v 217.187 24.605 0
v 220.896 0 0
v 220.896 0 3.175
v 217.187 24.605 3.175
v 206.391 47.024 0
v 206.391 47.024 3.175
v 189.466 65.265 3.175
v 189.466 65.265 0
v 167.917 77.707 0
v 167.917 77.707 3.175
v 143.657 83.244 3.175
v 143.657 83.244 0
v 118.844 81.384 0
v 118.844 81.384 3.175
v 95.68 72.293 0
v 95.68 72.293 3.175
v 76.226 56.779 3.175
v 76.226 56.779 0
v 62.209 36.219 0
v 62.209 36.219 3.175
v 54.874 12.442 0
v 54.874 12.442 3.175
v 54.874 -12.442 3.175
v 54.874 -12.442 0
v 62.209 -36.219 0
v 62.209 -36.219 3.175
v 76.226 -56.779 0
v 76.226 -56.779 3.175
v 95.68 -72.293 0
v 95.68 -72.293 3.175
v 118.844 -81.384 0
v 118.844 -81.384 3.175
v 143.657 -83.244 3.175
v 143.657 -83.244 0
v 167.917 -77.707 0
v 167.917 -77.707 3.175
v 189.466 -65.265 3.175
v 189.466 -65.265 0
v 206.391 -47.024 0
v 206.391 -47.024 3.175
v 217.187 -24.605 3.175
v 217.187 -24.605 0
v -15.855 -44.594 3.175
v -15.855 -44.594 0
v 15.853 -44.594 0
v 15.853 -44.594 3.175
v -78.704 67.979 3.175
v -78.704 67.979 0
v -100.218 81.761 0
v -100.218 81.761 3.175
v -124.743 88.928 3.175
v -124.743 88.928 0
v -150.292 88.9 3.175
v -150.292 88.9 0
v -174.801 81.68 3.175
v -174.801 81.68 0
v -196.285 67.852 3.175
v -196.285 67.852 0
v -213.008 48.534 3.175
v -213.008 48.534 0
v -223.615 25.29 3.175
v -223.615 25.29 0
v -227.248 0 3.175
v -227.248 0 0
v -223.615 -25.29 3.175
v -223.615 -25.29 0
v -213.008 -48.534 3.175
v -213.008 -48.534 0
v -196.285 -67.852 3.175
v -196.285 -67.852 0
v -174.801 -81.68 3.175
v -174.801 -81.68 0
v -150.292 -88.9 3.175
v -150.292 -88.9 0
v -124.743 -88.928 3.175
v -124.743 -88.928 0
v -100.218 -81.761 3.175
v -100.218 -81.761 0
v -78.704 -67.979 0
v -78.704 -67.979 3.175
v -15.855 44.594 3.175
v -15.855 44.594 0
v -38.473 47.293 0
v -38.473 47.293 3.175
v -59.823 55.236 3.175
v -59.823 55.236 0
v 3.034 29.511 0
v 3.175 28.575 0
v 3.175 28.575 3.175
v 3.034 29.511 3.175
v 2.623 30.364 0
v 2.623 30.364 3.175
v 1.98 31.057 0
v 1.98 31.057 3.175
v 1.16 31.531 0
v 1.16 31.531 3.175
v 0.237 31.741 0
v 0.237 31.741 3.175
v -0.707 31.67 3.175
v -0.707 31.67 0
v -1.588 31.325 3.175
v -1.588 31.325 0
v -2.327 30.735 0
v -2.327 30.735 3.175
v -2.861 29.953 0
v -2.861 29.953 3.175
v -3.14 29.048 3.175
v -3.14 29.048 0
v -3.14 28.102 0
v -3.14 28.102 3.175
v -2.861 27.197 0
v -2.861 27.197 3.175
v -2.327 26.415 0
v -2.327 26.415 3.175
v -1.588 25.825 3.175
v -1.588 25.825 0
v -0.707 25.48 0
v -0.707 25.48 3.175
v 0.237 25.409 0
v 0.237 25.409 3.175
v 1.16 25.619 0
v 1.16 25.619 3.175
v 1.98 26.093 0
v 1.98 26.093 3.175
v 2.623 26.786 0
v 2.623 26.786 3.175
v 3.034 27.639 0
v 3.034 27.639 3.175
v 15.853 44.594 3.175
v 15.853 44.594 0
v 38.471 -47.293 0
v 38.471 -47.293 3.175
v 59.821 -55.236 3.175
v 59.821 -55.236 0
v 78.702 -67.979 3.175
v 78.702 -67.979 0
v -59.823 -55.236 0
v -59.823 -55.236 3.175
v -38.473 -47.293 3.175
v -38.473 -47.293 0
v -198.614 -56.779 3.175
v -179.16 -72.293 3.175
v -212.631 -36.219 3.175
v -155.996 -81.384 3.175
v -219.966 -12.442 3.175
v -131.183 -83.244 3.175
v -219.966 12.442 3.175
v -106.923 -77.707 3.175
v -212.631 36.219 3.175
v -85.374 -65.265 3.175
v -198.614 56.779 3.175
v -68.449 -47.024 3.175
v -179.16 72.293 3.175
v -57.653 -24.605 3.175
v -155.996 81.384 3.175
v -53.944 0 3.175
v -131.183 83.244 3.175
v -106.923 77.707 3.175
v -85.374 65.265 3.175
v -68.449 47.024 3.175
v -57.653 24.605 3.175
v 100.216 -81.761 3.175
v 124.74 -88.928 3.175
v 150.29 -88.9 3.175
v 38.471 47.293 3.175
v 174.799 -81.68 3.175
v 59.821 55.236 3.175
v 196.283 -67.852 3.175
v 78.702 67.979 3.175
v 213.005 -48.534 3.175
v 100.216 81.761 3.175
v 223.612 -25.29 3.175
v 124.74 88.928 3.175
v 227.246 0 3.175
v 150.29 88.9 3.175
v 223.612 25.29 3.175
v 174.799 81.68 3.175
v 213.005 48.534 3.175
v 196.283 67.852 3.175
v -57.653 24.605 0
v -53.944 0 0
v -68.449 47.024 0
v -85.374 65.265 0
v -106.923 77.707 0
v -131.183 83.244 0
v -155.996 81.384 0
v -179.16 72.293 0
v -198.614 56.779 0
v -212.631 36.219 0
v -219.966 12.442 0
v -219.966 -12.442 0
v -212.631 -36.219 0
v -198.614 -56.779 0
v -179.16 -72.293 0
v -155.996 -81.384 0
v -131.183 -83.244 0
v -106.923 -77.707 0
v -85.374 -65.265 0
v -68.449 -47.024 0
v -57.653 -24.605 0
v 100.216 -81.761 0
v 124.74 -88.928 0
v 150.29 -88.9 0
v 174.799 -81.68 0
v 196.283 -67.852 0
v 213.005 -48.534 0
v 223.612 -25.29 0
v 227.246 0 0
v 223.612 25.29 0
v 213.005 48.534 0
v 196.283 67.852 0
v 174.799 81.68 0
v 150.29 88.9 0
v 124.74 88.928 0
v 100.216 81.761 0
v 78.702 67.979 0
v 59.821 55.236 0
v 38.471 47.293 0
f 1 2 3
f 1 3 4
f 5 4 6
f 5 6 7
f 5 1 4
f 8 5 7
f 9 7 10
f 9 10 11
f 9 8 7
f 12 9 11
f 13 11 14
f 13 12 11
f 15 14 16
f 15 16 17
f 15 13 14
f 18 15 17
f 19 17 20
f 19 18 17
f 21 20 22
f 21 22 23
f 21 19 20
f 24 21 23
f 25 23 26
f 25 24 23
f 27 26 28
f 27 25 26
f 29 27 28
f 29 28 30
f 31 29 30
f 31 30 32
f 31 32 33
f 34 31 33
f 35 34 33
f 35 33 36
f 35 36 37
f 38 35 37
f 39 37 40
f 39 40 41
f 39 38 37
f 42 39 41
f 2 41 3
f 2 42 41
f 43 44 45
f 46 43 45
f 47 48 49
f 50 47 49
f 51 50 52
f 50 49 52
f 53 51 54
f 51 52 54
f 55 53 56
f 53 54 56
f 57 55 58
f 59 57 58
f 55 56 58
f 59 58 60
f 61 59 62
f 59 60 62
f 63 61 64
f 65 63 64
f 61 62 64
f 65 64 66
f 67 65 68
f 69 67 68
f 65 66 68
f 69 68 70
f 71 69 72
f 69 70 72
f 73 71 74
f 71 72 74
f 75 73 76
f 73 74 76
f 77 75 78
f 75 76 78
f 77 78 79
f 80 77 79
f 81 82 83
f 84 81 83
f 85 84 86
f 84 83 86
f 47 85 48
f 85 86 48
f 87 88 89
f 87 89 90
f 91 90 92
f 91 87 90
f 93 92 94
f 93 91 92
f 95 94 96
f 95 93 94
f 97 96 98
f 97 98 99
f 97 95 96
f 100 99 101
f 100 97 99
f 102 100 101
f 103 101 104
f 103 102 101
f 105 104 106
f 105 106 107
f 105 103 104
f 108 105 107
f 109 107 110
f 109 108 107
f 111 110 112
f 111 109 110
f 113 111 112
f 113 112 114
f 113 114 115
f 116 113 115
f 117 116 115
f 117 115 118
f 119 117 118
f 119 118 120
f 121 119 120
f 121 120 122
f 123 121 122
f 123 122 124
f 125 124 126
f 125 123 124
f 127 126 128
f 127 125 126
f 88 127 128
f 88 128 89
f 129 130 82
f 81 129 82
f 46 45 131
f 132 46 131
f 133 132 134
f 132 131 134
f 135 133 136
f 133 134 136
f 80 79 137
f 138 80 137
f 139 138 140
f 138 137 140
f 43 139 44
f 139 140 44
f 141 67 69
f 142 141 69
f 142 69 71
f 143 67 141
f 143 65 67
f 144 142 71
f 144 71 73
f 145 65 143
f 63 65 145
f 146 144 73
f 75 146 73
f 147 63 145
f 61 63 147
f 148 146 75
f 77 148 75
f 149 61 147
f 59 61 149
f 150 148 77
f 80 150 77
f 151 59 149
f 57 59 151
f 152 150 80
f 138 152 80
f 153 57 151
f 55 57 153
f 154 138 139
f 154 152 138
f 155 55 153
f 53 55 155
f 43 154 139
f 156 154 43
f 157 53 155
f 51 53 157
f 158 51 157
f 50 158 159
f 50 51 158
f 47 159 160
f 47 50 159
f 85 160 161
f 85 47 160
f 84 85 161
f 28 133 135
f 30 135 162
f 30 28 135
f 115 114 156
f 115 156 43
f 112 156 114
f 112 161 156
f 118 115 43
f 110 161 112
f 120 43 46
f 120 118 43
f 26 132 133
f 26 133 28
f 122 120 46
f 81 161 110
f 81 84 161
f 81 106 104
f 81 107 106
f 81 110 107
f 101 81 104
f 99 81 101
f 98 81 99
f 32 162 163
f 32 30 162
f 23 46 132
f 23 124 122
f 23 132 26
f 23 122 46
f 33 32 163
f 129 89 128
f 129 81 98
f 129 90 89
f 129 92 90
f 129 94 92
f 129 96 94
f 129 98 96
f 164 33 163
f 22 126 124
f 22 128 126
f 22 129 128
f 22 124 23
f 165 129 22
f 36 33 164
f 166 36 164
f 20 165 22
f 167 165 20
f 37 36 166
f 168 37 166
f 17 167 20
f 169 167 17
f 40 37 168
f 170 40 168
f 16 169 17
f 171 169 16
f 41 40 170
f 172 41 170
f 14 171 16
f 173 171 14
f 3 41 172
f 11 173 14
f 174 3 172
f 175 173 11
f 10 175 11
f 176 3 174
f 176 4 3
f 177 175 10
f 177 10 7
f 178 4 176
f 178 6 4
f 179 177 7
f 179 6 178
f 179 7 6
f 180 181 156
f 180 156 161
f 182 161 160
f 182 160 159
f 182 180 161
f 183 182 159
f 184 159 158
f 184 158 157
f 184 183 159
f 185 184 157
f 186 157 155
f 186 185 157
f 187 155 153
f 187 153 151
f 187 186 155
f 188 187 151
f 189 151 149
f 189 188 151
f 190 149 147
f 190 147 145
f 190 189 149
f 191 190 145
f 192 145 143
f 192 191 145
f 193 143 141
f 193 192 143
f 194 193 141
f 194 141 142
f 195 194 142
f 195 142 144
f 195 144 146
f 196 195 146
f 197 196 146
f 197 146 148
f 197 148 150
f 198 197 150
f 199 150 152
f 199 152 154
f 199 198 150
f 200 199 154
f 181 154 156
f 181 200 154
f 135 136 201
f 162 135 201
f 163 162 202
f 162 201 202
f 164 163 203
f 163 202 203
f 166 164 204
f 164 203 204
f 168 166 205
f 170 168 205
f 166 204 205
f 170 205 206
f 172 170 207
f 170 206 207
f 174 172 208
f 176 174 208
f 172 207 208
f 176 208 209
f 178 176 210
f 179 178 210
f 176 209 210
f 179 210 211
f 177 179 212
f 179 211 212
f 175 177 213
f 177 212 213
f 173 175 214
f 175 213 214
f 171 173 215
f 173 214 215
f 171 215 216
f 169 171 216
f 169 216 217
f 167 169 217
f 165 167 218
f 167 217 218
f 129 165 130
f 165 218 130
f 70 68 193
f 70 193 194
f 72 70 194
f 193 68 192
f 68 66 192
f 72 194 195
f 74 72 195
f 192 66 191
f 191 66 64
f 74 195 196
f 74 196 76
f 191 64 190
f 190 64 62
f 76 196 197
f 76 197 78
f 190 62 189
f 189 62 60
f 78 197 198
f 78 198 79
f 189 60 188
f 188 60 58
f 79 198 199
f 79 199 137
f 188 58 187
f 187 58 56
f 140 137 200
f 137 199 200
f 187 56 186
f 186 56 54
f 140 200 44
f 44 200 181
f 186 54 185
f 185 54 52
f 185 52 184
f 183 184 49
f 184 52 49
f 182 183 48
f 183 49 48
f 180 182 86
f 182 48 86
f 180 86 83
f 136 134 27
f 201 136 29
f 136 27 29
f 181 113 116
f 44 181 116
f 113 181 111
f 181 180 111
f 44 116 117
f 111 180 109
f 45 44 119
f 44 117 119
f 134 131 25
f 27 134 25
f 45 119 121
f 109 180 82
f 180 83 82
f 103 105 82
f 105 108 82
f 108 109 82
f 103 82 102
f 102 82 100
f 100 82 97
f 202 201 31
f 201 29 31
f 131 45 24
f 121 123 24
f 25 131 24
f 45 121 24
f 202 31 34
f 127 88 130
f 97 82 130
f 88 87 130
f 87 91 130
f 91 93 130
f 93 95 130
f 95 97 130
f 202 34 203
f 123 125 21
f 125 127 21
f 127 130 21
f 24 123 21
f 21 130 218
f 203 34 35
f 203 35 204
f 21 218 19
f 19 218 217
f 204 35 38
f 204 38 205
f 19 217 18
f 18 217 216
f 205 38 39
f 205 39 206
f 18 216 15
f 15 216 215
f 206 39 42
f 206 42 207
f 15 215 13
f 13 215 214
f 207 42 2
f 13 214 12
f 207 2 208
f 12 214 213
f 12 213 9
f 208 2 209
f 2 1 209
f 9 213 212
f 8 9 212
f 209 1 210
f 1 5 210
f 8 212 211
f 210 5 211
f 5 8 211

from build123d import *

# Parameters (mm, degrees)
SKETCH1_R           = 83.4771
SKETCH1_R_2         = 3.175
BOSS_EXTRUDE1_DEPTH = 3.175


with BuildPart() as part:
    # Sketch1 → Boss-Extrude1 (new body)
    with BuildSketch(Plane.XY):
        with BuildLine():
            Line((-15.854735322, -44.594342032), (15.852600775, -44.594342032))
            ThreePointArc((15.852600775, -44.594342032), (49.382027762, -50.630069264), (78.701832464, -67.979464917))
            ThreePointArc((78.701832464, -67.979464917), (227.246053, 0), (78.701832464, 67.979464917))
            ThreePointArc((78.701832464, 67.979464917), (49.382027762, 50.630069264), (15.852600775, 44.594342032))
            Line((15.852600775, 44.594342032), (-15.854735322, 44.594342032))
            ThreePointArc((-15.854735322, 44.594342032), (-49.384162309, 50.630069264), (-78.703967011, 67.979464917))
            ThreePointArc((-78.703967011, 67.979464917), (-227.248187547, 0), (-78.703967011, -67.979464917))
            ThreePointArc((-78.703967011, -67.979464917), (-49.384162309, -50.630069264), (-15.854735322, -44.594342032))
        make_face()
        with Locations((137.418953, 0)):
            Circle(SKETCH1_R, mode=Mode.SUBTRACT)
        with Locations((-137.421087547, 0)):
            Circle(SKETCH1_R, mode=Mode.SUBTRACT)
        with Locations((0, 28.575000036)):
            Circle(SKETCH1_R_2, mode=Mode.SUBTRACT)
    extrude(amount=BOSS_EXTRUDE1_DEPTH)


solid = part.part
